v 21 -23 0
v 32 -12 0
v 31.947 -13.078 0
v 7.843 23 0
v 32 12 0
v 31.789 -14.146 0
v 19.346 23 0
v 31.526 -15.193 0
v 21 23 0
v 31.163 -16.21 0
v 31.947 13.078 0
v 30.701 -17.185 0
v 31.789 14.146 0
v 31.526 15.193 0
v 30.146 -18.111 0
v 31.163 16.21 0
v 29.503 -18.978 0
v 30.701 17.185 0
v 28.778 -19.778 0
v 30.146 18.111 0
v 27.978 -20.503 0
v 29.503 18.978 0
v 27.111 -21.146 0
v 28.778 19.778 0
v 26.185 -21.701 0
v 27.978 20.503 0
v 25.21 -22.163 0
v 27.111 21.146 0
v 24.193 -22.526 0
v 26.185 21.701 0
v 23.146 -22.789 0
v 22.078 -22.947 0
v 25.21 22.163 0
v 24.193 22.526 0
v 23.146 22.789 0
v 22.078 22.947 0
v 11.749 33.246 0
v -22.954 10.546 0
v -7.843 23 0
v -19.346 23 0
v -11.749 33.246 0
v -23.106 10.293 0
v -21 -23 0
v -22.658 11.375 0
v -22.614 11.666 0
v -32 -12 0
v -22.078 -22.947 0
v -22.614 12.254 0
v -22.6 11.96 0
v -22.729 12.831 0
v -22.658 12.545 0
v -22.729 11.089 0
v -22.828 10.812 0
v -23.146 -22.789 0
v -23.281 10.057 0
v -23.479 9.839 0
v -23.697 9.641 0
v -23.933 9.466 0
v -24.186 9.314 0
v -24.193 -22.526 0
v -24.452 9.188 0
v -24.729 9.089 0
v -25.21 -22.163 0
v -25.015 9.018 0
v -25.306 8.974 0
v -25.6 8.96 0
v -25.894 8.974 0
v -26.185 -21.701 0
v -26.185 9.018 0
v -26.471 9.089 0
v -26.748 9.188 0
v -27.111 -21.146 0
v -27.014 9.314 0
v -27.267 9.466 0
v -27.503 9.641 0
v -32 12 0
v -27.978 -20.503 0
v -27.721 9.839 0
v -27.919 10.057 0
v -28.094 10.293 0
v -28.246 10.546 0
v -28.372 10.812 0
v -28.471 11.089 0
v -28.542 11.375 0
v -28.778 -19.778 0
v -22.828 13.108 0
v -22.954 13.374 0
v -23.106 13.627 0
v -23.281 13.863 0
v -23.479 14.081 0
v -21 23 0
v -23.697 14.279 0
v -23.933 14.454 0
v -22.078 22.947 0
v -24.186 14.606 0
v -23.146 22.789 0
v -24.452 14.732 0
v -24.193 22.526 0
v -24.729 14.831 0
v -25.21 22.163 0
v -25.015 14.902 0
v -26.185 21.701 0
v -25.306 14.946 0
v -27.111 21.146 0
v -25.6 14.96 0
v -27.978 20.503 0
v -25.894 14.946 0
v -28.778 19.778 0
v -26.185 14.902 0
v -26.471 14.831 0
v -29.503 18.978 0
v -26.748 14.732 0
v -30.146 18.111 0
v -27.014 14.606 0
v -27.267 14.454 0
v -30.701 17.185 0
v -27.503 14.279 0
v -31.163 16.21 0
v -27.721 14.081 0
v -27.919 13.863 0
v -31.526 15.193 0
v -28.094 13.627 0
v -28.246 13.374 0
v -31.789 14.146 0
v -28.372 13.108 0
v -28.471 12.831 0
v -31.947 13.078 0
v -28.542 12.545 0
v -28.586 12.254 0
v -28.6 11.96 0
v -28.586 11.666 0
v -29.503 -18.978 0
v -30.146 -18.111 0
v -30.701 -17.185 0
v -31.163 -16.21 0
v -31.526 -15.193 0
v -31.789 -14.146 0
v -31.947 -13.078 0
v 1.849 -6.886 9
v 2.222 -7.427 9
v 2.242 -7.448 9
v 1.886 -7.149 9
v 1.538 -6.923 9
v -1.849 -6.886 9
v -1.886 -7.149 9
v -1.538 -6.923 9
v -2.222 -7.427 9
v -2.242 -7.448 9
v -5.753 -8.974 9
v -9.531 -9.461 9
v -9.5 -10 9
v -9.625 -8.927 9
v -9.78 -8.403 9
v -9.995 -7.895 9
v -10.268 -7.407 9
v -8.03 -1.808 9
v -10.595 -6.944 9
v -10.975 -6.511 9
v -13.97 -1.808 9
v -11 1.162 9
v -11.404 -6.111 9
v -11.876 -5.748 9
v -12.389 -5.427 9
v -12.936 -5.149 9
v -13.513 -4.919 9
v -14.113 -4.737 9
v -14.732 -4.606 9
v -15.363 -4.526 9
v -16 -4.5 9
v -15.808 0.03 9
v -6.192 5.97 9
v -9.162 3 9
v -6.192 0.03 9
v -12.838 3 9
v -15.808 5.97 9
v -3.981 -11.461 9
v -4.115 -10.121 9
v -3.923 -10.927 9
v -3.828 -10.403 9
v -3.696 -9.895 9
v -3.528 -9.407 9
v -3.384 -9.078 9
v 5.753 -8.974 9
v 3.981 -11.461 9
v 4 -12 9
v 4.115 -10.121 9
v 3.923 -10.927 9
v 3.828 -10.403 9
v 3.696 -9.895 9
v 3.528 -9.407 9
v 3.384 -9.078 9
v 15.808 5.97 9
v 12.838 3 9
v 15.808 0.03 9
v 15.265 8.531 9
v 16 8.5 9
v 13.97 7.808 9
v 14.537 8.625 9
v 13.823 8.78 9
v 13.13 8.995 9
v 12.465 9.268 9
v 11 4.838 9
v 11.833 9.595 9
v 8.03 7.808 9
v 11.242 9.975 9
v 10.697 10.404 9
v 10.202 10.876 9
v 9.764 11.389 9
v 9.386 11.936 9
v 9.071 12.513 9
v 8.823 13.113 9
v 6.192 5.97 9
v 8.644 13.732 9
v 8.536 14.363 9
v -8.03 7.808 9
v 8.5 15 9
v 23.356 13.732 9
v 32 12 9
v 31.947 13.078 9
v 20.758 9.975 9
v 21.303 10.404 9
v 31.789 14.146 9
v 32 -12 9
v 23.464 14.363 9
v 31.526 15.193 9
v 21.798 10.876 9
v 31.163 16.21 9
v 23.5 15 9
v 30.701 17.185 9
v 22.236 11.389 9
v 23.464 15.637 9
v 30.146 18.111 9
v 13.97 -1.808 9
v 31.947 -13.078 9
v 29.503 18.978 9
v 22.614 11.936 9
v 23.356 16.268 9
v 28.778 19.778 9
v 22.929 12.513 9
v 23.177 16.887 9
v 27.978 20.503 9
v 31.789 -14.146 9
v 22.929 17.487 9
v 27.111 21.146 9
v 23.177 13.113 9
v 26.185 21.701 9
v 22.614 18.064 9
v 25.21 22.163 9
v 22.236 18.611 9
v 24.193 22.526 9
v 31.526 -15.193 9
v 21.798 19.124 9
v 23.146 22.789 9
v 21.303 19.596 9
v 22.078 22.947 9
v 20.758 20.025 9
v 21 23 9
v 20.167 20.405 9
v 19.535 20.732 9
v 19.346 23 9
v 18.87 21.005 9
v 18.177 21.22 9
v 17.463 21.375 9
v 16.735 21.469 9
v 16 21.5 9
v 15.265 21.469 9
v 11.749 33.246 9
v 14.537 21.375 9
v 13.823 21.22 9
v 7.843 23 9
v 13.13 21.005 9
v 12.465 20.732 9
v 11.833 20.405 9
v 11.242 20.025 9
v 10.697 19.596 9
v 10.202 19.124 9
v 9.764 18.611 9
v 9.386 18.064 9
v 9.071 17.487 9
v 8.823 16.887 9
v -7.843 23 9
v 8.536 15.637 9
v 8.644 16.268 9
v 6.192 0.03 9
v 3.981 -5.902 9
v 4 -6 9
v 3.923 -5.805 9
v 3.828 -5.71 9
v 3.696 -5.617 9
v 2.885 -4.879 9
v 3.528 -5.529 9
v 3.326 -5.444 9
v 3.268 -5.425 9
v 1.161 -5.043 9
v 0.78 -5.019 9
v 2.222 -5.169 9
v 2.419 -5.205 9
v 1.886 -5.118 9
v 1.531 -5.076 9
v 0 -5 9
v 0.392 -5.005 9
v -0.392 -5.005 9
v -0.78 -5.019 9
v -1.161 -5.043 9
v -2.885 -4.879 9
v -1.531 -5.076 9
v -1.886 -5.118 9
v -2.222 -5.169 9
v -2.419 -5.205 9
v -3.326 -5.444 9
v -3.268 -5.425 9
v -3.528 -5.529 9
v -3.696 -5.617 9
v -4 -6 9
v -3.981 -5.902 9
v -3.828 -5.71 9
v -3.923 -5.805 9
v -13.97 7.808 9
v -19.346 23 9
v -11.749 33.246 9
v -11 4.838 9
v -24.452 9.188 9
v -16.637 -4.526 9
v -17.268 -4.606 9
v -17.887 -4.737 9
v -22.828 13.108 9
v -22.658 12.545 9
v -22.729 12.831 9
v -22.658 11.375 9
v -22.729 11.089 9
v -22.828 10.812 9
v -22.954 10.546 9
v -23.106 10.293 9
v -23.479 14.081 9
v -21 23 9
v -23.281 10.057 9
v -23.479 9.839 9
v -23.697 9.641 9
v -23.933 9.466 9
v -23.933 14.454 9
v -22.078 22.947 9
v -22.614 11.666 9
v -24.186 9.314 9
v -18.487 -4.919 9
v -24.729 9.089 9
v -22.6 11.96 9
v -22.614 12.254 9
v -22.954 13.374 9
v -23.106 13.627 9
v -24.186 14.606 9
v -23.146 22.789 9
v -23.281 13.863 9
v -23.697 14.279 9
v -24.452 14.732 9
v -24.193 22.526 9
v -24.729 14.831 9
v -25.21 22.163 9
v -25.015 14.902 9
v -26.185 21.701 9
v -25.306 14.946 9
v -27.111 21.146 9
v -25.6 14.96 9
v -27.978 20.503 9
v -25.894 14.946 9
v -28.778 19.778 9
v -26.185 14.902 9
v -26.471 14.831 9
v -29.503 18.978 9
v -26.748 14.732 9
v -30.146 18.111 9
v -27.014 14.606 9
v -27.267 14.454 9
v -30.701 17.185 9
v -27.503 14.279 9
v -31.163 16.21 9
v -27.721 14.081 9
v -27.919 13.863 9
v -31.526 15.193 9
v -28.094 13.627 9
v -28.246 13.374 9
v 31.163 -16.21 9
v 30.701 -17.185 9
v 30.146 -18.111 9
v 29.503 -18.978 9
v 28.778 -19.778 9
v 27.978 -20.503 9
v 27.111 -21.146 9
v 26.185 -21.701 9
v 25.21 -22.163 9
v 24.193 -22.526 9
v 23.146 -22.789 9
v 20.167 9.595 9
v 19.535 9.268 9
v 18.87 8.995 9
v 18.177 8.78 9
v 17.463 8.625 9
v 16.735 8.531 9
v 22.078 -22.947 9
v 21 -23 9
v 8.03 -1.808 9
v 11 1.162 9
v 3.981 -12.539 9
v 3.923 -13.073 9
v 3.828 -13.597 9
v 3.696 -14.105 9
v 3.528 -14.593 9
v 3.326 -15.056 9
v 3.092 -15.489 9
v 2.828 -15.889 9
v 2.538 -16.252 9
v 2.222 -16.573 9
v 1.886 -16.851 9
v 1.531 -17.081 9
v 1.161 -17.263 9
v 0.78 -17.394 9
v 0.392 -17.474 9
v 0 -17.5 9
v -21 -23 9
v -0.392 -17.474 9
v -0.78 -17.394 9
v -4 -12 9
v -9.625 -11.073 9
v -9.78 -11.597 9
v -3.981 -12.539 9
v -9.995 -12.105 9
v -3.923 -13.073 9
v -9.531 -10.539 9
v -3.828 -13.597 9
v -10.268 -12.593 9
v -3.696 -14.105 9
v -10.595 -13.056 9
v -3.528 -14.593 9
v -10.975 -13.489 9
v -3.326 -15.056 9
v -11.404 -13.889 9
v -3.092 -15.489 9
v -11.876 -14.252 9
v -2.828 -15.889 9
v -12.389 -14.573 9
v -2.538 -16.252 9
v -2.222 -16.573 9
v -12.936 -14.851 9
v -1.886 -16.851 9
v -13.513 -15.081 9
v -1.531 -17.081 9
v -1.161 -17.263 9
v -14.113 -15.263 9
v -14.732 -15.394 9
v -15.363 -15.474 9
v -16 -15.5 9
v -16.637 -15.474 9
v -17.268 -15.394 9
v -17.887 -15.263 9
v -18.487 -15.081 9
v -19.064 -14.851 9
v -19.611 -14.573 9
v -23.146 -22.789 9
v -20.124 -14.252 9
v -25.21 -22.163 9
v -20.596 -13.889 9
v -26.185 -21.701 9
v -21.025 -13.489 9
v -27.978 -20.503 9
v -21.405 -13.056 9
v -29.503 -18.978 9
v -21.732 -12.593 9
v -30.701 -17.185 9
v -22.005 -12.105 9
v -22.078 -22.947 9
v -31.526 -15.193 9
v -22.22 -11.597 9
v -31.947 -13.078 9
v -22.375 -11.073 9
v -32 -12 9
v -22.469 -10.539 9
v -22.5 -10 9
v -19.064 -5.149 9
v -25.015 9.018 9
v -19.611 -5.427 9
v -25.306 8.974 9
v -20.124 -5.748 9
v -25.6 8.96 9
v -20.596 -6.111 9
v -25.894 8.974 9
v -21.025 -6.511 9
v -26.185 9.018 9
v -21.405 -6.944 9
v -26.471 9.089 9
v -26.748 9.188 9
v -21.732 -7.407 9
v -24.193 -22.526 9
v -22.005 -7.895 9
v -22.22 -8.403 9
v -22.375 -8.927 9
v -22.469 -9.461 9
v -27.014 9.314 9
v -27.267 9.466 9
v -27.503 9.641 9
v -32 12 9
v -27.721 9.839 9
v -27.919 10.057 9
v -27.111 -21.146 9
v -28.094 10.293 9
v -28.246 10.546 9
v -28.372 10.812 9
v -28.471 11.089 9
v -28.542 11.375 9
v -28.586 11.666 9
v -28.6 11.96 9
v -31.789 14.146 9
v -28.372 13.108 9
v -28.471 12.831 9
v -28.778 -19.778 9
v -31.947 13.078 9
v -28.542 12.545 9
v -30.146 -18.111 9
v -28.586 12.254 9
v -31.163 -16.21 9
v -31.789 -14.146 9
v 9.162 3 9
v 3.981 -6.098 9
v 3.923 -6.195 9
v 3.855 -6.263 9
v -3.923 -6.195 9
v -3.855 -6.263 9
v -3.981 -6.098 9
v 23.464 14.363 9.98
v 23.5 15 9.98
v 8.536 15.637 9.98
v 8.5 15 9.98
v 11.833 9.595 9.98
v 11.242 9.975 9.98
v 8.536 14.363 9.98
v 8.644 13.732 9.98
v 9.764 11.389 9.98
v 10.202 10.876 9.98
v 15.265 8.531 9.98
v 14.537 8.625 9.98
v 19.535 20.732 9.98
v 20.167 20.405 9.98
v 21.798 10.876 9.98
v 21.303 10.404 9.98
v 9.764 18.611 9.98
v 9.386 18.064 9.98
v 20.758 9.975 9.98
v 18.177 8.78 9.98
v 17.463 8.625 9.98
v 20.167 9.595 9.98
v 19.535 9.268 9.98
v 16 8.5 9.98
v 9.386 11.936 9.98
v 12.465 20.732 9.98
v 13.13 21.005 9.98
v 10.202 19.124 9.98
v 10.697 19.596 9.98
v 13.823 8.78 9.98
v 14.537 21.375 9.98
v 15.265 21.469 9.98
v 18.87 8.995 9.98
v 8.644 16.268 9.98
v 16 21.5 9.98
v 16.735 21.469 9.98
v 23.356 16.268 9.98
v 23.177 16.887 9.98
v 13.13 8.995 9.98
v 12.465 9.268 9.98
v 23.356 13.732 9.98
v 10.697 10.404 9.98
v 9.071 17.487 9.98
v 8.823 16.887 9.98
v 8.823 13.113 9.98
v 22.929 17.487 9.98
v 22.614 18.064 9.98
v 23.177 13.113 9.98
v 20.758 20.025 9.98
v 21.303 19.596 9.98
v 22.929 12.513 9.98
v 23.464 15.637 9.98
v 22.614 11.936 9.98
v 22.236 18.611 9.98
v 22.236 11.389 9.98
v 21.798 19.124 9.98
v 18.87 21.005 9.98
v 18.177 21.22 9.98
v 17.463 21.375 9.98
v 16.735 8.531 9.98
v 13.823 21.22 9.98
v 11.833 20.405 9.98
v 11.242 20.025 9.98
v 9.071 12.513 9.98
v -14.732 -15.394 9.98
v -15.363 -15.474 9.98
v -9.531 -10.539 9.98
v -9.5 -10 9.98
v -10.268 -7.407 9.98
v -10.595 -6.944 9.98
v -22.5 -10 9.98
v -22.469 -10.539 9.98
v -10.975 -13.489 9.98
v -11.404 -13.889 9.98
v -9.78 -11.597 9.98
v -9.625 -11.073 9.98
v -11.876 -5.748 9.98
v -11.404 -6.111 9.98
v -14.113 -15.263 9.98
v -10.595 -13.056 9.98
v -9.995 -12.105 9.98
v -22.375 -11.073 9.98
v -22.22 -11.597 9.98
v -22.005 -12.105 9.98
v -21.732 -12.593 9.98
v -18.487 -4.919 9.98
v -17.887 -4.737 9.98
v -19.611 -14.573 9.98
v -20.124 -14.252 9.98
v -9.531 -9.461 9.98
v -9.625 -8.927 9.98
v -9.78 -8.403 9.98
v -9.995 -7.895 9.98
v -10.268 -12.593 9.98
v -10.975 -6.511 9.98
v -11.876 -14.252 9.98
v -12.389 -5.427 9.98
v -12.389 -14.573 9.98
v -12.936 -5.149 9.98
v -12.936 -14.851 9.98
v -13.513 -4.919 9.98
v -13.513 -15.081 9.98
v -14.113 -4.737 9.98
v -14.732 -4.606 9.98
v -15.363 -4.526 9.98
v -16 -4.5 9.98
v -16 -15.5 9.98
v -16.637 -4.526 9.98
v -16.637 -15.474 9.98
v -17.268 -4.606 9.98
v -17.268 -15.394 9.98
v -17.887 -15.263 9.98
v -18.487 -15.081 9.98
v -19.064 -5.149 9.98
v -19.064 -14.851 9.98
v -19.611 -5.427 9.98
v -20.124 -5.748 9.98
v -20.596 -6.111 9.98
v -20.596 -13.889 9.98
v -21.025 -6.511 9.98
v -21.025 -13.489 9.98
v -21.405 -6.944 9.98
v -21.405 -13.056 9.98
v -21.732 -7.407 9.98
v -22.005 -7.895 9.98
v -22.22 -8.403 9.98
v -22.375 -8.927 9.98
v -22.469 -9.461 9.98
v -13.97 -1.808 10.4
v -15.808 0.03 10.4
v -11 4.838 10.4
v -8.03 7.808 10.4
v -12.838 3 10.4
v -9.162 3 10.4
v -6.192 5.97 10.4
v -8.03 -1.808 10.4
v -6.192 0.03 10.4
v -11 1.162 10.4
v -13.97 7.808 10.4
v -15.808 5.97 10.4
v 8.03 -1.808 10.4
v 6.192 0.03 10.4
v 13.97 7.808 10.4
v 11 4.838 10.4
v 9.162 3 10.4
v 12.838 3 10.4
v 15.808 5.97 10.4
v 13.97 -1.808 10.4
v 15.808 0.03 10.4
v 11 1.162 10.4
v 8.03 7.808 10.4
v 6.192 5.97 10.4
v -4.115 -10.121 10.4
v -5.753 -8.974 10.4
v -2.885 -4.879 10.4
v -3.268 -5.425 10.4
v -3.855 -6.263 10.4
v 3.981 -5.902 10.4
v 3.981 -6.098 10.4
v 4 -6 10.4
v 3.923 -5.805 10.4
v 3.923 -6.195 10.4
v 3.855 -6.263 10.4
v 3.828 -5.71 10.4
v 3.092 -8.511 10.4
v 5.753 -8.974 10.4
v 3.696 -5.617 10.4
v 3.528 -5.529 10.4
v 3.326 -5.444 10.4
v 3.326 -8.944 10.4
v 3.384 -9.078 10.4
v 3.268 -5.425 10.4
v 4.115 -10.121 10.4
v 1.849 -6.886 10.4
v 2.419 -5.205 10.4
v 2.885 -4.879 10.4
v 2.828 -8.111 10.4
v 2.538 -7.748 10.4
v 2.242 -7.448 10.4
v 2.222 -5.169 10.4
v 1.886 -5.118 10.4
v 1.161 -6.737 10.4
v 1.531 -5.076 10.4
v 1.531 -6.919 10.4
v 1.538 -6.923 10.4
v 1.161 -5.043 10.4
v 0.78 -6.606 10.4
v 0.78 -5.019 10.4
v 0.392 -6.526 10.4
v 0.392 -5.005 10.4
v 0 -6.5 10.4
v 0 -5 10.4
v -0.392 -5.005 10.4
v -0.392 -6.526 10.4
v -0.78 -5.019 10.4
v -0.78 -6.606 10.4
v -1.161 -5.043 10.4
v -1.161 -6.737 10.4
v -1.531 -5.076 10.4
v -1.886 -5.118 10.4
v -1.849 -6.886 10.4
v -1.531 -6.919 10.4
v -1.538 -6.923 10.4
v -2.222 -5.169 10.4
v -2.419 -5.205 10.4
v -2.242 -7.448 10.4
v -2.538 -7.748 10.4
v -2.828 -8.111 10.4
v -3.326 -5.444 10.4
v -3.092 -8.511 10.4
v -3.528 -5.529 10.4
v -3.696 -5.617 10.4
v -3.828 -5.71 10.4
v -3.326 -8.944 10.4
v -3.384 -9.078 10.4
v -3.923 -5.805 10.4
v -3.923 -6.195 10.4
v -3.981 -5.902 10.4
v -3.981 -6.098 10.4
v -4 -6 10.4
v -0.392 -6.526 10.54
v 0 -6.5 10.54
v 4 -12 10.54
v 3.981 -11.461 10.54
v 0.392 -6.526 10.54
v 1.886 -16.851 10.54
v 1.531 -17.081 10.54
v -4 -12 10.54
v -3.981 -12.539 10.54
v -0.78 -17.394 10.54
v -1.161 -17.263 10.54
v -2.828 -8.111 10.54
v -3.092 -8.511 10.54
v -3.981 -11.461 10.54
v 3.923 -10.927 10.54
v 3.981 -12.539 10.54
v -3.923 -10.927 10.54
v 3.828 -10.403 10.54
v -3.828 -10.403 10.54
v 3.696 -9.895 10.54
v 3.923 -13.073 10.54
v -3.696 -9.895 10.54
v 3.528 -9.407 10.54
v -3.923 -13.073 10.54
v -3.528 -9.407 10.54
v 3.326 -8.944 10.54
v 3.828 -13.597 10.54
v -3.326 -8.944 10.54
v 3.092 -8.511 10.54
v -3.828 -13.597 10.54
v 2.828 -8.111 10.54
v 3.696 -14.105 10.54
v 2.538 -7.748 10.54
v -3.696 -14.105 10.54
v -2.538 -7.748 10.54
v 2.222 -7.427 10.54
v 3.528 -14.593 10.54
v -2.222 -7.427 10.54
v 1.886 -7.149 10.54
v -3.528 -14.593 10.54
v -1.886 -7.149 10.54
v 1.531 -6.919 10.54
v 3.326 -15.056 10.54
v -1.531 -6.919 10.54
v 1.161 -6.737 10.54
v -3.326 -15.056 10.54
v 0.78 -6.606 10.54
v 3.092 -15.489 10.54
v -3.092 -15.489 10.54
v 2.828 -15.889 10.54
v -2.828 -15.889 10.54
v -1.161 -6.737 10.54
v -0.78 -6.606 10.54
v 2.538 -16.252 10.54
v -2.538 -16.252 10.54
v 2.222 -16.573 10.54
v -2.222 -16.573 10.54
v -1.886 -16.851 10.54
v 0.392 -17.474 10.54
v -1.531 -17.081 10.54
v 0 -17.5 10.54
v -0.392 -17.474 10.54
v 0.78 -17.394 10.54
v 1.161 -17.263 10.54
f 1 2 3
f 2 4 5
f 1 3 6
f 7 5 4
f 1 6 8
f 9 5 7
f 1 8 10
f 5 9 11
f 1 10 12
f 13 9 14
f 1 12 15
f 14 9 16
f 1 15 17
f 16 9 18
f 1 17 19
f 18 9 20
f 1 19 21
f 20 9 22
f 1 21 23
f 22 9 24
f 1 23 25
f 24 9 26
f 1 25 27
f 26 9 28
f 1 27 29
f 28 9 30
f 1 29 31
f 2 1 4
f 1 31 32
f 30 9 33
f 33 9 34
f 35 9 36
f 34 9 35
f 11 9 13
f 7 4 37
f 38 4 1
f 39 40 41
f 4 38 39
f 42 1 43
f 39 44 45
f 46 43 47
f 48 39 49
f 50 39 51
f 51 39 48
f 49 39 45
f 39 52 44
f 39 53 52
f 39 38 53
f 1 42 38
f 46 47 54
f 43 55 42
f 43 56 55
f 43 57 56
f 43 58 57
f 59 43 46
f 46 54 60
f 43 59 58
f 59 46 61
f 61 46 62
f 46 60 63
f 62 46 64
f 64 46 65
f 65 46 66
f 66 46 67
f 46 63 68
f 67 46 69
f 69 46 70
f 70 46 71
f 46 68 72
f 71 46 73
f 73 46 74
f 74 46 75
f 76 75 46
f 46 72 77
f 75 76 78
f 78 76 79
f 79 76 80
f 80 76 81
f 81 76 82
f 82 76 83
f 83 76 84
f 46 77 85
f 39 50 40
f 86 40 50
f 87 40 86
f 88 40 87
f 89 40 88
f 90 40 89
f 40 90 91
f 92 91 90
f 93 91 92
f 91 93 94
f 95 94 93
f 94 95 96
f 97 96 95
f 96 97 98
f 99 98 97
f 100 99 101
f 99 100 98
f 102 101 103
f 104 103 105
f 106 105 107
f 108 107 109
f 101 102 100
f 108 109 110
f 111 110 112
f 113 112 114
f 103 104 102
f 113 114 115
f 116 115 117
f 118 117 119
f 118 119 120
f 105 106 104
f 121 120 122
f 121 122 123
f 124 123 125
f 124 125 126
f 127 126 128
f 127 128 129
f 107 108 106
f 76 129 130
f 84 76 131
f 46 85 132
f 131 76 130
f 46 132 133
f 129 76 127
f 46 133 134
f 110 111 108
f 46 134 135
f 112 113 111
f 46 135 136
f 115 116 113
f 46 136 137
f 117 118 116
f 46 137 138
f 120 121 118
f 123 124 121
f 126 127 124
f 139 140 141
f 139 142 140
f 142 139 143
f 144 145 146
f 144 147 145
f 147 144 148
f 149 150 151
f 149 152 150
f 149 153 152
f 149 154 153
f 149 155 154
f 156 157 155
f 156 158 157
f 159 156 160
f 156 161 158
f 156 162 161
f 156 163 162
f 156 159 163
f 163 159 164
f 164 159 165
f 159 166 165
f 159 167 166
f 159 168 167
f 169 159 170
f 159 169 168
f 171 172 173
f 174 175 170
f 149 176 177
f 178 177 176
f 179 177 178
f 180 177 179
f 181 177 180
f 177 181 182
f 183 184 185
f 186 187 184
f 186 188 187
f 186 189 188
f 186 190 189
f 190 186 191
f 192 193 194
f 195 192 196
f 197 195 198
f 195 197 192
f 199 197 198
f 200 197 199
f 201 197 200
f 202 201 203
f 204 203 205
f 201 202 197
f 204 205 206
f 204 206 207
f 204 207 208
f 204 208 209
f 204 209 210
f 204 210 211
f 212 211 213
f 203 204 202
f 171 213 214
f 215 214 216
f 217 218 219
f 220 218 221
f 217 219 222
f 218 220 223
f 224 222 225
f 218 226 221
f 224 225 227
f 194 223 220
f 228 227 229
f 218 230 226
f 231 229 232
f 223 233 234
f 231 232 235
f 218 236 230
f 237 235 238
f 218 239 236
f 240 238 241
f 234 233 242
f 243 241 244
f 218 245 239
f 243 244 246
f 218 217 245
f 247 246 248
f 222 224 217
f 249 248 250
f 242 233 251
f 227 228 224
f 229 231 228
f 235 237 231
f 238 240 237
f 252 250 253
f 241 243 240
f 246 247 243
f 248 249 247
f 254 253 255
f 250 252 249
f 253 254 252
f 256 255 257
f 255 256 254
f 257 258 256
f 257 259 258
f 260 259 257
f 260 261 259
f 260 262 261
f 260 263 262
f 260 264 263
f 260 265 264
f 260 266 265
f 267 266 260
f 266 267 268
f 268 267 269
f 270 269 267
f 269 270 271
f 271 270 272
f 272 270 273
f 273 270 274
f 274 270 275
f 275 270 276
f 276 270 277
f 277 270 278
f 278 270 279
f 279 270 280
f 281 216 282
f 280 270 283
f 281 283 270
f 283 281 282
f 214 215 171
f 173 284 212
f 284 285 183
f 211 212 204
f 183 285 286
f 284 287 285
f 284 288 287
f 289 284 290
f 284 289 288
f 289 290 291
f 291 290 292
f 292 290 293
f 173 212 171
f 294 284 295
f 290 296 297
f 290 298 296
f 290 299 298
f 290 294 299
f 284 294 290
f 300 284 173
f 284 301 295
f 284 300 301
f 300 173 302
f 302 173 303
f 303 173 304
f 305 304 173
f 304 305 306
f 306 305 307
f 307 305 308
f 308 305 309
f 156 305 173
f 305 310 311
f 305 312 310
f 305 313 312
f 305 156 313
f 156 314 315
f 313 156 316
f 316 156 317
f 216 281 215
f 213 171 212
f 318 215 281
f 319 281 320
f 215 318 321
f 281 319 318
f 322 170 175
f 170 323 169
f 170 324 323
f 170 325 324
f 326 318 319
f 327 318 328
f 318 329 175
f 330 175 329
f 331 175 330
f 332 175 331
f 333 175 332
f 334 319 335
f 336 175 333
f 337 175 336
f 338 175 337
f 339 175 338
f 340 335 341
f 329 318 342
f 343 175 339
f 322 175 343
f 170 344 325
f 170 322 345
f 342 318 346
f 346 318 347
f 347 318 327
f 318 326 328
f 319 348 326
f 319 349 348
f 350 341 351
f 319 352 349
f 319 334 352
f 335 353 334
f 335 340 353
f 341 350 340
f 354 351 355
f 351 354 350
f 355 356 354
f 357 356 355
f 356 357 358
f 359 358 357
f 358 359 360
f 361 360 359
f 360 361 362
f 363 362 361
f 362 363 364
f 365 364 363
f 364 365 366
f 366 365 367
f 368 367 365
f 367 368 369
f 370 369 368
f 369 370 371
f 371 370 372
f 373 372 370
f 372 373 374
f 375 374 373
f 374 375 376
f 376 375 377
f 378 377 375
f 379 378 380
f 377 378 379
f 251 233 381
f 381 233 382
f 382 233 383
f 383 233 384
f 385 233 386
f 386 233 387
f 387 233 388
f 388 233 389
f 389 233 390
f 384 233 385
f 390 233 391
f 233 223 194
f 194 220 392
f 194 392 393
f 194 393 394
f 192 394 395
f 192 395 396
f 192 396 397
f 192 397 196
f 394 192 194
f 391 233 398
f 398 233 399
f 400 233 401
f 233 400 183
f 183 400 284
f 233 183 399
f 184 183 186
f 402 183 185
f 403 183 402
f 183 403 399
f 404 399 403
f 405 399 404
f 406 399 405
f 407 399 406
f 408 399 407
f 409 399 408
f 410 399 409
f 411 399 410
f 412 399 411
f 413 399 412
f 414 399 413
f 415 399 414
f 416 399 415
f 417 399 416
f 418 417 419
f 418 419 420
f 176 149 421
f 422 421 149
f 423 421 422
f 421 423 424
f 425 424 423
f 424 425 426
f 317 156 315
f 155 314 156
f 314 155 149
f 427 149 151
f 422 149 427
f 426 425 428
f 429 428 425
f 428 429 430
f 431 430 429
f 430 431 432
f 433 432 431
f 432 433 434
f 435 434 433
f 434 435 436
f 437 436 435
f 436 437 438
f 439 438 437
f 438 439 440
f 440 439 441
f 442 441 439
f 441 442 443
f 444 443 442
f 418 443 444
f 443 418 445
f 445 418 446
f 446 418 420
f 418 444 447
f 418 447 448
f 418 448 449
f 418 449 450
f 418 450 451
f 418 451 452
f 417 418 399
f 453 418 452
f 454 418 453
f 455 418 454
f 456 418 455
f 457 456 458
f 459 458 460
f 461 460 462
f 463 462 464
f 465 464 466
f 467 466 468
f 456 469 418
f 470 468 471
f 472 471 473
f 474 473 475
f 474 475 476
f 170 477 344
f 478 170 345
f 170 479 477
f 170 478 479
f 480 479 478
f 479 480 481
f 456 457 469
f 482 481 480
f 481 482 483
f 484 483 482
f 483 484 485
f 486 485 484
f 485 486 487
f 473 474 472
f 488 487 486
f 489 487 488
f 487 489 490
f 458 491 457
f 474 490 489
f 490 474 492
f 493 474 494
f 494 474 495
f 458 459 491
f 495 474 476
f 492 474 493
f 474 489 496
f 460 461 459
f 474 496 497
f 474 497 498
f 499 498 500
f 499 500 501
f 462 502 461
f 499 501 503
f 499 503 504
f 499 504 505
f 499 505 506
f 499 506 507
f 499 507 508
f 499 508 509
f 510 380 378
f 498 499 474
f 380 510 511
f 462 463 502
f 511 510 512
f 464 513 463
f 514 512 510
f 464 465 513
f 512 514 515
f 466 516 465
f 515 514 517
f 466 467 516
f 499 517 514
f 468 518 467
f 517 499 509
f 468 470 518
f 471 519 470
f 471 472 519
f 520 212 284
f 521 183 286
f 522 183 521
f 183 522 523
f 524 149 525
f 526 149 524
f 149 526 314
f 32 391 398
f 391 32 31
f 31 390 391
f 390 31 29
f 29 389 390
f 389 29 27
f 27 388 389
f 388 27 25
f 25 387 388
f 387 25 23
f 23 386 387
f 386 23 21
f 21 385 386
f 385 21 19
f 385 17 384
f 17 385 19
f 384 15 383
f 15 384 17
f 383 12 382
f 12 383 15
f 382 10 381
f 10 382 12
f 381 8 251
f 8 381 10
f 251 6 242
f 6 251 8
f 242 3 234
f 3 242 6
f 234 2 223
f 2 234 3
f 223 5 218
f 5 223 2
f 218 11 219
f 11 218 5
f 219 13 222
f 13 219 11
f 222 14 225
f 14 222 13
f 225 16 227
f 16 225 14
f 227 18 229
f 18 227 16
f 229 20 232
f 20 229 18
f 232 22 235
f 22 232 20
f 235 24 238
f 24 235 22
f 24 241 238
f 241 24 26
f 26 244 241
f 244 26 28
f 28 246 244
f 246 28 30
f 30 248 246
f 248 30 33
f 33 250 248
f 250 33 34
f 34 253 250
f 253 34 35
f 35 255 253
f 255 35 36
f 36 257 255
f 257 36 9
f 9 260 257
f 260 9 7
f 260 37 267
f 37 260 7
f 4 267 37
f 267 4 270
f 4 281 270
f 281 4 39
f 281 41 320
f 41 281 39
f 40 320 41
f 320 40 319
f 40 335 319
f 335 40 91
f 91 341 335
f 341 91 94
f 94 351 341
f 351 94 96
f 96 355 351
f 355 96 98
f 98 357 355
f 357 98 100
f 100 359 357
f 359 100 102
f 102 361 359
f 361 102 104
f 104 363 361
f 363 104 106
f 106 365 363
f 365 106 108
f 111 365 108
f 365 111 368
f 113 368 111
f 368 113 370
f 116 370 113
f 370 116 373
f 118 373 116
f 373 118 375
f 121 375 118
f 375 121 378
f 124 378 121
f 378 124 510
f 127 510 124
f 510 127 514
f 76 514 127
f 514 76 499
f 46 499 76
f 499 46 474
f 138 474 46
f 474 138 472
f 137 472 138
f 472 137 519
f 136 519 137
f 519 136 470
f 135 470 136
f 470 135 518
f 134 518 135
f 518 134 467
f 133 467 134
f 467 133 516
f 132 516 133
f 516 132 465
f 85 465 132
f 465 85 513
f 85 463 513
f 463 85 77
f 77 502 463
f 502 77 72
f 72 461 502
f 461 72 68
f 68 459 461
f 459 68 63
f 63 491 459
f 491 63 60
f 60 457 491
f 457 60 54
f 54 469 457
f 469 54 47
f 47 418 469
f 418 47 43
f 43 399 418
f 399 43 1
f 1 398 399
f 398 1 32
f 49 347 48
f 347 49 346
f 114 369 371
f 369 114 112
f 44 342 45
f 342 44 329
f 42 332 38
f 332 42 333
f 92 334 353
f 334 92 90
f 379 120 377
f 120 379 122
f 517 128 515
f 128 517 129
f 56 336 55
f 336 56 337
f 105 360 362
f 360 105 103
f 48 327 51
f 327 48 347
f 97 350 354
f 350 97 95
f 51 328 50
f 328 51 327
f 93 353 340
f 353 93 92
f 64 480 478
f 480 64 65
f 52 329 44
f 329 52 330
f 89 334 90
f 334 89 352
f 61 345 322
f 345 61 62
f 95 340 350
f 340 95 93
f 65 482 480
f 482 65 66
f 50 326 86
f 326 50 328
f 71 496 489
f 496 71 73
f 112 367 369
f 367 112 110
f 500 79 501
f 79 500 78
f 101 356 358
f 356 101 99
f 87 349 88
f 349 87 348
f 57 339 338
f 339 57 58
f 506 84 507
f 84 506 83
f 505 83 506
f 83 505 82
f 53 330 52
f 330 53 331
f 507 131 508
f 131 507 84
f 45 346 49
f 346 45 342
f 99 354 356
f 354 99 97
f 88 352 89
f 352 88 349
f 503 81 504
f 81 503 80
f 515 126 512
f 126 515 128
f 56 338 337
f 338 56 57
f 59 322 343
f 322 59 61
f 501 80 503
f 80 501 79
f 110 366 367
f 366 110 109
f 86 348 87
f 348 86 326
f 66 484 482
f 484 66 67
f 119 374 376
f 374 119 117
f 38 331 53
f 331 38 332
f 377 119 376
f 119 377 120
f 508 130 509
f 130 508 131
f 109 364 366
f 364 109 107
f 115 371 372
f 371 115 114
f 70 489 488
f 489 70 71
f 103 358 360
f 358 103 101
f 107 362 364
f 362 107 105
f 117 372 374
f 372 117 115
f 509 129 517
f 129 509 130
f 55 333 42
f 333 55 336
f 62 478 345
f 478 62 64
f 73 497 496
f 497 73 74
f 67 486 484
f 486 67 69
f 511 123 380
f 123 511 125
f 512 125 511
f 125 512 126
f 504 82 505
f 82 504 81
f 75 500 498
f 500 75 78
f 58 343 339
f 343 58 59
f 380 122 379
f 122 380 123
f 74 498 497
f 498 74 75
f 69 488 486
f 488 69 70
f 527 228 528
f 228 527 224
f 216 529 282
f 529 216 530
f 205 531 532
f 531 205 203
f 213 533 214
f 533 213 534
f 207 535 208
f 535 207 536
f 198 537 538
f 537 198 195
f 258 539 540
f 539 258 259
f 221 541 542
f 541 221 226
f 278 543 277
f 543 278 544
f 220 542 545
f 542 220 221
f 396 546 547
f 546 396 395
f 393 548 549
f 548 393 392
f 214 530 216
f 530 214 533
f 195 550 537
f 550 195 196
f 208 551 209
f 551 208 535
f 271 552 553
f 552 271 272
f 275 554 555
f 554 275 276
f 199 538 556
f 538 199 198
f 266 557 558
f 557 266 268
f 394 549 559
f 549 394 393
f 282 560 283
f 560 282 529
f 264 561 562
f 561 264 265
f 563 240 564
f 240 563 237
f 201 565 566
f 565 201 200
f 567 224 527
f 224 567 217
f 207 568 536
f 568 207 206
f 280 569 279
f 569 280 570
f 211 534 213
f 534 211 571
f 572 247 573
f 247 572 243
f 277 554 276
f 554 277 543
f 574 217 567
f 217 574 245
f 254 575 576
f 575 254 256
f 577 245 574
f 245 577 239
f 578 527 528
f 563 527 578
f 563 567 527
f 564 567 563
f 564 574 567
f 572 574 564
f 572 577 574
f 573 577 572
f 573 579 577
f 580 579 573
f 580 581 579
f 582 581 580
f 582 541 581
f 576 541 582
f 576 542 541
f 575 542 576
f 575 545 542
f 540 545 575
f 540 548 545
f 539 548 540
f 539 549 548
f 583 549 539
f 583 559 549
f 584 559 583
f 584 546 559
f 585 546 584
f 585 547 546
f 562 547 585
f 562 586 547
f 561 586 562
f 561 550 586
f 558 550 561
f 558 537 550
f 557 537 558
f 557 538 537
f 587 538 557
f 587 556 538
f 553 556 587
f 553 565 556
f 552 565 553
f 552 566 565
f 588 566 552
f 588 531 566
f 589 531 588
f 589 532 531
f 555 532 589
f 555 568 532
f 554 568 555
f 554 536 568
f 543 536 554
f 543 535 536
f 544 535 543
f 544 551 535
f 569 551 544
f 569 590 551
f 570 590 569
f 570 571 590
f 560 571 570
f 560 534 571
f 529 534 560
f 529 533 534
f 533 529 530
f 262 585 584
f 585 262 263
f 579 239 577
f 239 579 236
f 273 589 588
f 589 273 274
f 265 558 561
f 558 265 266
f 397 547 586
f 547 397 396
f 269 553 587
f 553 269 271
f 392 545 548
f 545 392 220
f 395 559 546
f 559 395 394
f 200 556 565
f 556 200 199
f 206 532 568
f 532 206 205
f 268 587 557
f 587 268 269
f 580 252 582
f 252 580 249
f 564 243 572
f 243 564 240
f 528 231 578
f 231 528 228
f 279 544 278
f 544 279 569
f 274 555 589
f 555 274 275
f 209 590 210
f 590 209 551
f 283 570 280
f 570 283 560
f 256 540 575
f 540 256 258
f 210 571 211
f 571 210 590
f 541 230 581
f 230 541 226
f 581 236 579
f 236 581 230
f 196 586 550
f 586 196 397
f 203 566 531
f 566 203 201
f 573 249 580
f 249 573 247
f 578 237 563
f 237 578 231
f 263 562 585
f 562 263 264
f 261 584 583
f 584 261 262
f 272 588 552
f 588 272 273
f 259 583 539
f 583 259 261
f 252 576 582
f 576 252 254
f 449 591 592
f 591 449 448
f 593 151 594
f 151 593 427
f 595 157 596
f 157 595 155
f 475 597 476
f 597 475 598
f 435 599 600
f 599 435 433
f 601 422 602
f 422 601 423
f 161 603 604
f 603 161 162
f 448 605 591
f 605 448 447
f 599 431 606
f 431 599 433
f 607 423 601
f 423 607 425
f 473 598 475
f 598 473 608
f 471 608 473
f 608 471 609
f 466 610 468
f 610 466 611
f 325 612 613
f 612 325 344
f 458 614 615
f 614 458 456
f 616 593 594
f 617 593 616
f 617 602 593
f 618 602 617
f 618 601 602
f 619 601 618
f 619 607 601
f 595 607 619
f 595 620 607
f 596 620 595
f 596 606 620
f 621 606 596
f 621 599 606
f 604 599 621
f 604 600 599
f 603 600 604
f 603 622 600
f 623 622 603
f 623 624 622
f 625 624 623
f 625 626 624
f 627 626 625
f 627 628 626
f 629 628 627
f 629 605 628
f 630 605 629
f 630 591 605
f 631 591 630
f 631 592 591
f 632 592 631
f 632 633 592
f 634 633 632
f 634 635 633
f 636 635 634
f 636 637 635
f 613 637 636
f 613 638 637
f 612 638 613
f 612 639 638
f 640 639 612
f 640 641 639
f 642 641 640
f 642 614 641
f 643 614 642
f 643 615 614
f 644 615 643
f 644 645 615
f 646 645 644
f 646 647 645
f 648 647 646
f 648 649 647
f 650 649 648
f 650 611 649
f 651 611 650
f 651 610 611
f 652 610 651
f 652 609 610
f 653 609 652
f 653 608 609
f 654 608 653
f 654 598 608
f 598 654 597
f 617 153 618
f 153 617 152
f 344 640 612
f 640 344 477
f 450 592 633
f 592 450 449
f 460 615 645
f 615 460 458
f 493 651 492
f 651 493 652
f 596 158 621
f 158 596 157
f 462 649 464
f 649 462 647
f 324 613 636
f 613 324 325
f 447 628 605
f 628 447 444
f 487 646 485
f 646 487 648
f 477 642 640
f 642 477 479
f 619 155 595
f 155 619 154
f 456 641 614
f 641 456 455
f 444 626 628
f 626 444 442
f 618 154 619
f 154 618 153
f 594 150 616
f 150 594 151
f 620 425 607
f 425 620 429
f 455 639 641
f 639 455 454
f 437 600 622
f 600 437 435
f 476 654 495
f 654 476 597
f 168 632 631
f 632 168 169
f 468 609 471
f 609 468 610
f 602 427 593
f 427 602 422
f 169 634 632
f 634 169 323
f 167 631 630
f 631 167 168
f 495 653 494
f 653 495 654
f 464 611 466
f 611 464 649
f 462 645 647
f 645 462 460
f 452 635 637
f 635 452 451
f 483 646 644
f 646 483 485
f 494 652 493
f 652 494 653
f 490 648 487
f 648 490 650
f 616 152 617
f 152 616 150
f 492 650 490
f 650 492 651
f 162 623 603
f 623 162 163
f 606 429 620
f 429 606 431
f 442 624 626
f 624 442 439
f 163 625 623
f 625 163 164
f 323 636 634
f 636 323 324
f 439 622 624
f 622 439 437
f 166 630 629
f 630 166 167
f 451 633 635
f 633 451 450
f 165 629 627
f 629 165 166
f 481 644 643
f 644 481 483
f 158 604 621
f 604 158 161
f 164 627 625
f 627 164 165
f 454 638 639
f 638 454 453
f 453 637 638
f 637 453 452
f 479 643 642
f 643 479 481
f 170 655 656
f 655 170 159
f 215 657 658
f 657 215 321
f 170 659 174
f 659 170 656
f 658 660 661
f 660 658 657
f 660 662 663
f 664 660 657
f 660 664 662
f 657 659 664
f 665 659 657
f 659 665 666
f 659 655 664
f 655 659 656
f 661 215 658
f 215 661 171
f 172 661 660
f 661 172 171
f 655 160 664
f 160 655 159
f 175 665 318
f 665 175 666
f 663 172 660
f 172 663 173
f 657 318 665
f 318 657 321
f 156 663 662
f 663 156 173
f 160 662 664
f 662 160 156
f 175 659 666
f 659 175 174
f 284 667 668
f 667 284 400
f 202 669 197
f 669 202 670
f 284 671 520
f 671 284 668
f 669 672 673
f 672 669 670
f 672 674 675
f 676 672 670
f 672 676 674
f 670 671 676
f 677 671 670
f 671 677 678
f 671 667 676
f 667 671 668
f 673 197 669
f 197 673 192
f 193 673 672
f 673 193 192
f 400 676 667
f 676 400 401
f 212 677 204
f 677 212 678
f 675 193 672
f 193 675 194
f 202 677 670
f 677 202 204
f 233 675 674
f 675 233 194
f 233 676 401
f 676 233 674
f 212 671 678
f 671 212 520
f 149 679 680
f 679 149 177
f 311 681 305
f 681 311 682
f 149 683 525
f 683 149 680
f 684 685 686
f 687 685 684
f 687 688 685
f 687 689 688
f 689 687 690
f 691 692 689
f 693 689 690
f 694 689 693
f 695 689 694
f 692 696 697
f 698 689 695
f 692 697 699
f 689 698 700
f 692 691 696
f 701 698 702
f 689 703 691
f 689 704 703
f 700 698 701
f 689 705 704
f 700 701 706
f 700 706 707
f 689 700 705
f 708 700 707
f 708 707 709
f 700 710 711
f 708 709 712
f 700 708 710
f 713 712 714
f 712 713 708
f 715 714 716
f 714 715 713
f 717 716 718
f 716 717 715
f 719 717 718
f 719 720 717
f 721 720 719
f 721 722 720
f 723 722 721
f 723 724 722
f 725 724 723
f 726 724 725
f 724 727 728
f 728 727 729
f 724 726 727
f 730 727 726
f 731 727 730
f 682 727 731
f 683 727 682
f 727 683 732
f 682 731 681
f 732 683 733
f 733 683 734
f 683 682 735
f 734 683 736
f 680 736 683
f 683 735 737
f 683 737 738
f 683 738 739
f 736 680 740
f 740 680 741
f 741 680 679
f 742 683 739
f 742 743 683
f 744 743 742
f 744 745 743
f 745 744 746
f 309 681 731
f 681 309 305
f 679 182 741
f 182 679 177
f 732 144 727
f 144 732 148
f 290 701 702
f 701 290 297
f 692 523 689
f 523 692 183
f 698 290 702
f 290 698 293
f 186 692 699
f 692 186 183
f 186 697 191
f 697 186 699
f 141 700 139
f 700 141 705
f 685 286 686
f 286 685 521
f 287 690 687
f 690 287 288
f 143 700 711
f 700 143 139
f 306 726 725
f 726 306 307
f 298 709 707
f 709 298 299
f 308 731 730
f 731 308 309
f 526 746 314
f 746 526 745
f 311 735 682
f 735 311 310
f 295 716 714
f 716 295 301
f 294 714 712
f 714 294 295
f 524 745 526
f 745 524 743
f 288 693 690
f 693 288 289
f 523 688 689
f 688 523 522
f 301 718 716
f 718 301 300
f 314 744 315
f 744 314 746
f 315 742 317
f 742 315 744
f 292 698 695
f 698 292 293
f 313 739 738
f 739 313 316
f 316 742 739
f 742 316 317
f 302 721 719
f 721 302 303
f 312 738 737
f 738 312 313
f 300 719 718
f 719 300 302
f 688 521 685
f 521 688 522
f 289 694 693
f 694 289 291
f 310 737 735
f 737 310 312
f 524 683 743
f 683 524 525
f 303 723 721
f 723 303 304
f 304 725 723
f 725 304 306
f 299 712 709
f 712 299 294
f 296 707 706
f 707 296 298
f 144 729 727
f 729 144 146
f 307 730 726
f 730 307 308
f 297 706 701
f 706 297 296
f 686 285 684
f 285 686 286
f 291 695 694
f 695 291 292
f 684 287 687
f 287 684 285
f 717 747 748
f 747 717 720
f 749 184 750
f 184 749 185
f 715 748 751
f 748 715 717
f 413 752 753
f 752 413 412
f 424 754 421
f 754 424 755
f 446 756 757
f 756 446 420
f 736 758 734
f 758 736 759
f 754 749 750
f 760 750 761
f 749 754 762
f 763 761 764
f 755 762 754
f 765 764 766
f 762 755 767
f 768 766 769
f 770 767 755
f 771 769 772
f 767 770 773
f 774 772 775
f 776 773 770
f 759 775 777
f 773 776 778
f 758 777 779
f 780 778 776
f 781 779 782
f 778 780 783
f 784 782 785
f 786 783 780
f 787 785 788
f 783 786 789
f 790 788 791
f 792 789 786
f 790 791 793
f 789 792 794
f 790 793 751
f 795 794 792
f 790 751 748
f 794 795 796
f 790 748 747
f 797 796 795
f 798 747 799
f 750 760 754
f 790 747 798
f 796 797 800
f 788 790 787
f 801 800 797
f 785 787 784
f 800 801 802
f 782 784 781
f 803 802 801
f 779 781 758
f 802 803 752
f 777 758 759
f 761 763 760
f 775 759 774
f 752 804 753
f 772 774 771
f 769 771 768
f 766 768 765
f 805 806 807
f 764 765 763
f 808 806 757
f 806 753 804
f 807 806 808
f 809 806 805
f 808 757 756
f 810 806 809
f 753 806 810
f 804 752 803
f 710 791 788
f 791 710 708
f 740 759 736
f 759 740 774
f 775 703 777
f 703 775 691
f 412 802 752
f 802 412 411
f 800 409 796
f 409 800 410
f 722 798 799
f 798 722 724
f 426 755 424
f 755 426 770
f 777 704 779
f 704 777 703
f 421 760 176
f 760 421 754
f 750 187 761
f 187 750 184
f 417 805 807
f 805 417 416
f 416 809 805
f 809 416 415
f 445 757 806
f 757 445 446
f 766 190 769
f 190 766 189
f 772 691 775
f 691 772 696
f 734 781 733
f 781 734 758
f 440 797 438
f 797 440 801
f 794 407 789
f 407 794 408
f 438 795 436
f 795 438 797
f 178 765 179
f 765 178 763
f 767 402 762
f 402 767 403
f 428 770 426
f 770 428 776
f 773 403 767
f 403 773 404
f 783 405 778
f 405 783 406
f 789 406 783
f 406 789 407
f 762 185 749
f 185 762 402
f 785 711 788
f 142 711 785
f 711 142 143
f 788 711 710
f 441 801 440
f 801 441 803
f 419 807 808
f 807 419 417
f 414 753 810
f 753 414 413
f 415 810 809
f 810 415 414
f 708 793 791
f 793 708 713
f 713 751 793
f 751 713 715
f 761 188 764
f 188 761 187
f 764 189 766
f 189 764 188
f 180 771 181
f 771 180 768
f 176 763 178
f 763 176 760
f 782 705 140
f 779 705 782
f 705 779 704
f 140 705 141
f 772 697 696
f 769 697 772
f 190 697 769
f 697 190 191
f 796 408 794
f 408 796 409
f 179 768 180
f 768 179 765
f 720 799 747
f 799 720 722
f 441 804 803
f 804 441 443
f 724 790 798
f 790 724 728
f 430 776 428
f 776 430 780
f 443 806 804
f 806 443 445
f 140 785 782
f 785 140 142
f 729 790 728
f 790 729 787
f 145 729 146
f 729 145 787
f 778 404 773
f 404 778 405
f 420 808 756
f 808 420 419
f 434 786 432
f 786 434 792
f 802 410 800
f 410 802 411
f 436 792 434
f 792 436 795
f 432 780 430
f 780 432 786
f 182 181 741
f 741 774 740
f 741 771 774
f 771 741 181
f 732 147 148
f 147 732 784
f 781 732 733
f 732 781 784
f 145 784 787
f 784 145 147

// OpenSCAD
// ============================================================
//  LuxeStyle - Flacher Kawaii-Katzen-Charm, MEHRFARBIG (AMS)
//  Koerper weiss + orange Flecken, Augen schwarz (X), Zunge orange.
//  Flach/taschentauglich. Eigenes Design, frei verkaufbar.
//  Druck (Bambu Studio + AMS): Koerper weiss, Flecken/Zunge orange,
//  Augen/Mund schwarz. Farbteile sind eigene erhabene Geometrie.
//  Rendern: openscad -o cat_charm.stl cat_charm.scad
// ============================================================

length = 64;   // mm
width  = 46;   // mm
thick  = 9;    // Dicke mm (flach)
edge_r = 11;
ring_d = 6;
eye_dx = 11;   // Augenabstand
eye_y  = 3;
emb    = 1.4;  // Erhebung der Farbteile
$fn = 64;

module body2d() {
    union() {
        offset(edge_r) offset(-edge_r) square([length, width], center = true);
        for (s = [-1, 1]) translate([s * 13, width / 2 - 5]) rotate(s * 16)
            polygon([[-9, -1], [9, -1], [s * 3, 15]]);   // Ohren
    }
}

// ---- weisser Koerper (mit Loch oben links, weg vom Gesicht) ----
color("white")
difference() {
    linear_extrude(thick) body2d();
    translate([-length * 0.40, width * 0.26, -1]) cylinder(d = ring_d, h = thick + 2);
}

// ---- orange Flecken (Calico-Look, 2 ausgewogen) ----
color("orange") {
    translate([16, 15, thick]) linear_extrude(emb * 0.7) resize([15, 13]) circle(d = 20);
    translate([-16, -10, thick]) linear_extrude(emb * 0.7) resize([13, 11]) circle(d = 20);
}

// ---- schwarze X-Augen (erhaben) ----
module xbar(px, py, ang)
    translate([px, py, thick]) rotate([0, 0, ang]) linear_extrude(emb)
        square([11, 2.6], center = true);
color("black")
for (s = [-1, 1]) { xbar(s * eye_dx, eye_y, 45); xbar(s * eye_dx, eye_y, -45); }

// ---- schwarzer Mund (klein, offen) ----
color("black") {
    translate([0, eye_y - 9, thick]) linear_extrude(emb) resize([8, 2]) circle(d = 10);
    for (s = [-1, 1]) translate([s * 3.5, eye_y - 10.5, thick]) rotate(s * -55)
        linear_extrude(emb) square([5, 2], center = true);
}

// ---- orange Zunge (erhaben, haengt raus) ----
color("orange")
translate([0, eye_y - 15, thick]) linear_extrude(emb * 1.1) resize([8, 11]) circle(d = 20);
